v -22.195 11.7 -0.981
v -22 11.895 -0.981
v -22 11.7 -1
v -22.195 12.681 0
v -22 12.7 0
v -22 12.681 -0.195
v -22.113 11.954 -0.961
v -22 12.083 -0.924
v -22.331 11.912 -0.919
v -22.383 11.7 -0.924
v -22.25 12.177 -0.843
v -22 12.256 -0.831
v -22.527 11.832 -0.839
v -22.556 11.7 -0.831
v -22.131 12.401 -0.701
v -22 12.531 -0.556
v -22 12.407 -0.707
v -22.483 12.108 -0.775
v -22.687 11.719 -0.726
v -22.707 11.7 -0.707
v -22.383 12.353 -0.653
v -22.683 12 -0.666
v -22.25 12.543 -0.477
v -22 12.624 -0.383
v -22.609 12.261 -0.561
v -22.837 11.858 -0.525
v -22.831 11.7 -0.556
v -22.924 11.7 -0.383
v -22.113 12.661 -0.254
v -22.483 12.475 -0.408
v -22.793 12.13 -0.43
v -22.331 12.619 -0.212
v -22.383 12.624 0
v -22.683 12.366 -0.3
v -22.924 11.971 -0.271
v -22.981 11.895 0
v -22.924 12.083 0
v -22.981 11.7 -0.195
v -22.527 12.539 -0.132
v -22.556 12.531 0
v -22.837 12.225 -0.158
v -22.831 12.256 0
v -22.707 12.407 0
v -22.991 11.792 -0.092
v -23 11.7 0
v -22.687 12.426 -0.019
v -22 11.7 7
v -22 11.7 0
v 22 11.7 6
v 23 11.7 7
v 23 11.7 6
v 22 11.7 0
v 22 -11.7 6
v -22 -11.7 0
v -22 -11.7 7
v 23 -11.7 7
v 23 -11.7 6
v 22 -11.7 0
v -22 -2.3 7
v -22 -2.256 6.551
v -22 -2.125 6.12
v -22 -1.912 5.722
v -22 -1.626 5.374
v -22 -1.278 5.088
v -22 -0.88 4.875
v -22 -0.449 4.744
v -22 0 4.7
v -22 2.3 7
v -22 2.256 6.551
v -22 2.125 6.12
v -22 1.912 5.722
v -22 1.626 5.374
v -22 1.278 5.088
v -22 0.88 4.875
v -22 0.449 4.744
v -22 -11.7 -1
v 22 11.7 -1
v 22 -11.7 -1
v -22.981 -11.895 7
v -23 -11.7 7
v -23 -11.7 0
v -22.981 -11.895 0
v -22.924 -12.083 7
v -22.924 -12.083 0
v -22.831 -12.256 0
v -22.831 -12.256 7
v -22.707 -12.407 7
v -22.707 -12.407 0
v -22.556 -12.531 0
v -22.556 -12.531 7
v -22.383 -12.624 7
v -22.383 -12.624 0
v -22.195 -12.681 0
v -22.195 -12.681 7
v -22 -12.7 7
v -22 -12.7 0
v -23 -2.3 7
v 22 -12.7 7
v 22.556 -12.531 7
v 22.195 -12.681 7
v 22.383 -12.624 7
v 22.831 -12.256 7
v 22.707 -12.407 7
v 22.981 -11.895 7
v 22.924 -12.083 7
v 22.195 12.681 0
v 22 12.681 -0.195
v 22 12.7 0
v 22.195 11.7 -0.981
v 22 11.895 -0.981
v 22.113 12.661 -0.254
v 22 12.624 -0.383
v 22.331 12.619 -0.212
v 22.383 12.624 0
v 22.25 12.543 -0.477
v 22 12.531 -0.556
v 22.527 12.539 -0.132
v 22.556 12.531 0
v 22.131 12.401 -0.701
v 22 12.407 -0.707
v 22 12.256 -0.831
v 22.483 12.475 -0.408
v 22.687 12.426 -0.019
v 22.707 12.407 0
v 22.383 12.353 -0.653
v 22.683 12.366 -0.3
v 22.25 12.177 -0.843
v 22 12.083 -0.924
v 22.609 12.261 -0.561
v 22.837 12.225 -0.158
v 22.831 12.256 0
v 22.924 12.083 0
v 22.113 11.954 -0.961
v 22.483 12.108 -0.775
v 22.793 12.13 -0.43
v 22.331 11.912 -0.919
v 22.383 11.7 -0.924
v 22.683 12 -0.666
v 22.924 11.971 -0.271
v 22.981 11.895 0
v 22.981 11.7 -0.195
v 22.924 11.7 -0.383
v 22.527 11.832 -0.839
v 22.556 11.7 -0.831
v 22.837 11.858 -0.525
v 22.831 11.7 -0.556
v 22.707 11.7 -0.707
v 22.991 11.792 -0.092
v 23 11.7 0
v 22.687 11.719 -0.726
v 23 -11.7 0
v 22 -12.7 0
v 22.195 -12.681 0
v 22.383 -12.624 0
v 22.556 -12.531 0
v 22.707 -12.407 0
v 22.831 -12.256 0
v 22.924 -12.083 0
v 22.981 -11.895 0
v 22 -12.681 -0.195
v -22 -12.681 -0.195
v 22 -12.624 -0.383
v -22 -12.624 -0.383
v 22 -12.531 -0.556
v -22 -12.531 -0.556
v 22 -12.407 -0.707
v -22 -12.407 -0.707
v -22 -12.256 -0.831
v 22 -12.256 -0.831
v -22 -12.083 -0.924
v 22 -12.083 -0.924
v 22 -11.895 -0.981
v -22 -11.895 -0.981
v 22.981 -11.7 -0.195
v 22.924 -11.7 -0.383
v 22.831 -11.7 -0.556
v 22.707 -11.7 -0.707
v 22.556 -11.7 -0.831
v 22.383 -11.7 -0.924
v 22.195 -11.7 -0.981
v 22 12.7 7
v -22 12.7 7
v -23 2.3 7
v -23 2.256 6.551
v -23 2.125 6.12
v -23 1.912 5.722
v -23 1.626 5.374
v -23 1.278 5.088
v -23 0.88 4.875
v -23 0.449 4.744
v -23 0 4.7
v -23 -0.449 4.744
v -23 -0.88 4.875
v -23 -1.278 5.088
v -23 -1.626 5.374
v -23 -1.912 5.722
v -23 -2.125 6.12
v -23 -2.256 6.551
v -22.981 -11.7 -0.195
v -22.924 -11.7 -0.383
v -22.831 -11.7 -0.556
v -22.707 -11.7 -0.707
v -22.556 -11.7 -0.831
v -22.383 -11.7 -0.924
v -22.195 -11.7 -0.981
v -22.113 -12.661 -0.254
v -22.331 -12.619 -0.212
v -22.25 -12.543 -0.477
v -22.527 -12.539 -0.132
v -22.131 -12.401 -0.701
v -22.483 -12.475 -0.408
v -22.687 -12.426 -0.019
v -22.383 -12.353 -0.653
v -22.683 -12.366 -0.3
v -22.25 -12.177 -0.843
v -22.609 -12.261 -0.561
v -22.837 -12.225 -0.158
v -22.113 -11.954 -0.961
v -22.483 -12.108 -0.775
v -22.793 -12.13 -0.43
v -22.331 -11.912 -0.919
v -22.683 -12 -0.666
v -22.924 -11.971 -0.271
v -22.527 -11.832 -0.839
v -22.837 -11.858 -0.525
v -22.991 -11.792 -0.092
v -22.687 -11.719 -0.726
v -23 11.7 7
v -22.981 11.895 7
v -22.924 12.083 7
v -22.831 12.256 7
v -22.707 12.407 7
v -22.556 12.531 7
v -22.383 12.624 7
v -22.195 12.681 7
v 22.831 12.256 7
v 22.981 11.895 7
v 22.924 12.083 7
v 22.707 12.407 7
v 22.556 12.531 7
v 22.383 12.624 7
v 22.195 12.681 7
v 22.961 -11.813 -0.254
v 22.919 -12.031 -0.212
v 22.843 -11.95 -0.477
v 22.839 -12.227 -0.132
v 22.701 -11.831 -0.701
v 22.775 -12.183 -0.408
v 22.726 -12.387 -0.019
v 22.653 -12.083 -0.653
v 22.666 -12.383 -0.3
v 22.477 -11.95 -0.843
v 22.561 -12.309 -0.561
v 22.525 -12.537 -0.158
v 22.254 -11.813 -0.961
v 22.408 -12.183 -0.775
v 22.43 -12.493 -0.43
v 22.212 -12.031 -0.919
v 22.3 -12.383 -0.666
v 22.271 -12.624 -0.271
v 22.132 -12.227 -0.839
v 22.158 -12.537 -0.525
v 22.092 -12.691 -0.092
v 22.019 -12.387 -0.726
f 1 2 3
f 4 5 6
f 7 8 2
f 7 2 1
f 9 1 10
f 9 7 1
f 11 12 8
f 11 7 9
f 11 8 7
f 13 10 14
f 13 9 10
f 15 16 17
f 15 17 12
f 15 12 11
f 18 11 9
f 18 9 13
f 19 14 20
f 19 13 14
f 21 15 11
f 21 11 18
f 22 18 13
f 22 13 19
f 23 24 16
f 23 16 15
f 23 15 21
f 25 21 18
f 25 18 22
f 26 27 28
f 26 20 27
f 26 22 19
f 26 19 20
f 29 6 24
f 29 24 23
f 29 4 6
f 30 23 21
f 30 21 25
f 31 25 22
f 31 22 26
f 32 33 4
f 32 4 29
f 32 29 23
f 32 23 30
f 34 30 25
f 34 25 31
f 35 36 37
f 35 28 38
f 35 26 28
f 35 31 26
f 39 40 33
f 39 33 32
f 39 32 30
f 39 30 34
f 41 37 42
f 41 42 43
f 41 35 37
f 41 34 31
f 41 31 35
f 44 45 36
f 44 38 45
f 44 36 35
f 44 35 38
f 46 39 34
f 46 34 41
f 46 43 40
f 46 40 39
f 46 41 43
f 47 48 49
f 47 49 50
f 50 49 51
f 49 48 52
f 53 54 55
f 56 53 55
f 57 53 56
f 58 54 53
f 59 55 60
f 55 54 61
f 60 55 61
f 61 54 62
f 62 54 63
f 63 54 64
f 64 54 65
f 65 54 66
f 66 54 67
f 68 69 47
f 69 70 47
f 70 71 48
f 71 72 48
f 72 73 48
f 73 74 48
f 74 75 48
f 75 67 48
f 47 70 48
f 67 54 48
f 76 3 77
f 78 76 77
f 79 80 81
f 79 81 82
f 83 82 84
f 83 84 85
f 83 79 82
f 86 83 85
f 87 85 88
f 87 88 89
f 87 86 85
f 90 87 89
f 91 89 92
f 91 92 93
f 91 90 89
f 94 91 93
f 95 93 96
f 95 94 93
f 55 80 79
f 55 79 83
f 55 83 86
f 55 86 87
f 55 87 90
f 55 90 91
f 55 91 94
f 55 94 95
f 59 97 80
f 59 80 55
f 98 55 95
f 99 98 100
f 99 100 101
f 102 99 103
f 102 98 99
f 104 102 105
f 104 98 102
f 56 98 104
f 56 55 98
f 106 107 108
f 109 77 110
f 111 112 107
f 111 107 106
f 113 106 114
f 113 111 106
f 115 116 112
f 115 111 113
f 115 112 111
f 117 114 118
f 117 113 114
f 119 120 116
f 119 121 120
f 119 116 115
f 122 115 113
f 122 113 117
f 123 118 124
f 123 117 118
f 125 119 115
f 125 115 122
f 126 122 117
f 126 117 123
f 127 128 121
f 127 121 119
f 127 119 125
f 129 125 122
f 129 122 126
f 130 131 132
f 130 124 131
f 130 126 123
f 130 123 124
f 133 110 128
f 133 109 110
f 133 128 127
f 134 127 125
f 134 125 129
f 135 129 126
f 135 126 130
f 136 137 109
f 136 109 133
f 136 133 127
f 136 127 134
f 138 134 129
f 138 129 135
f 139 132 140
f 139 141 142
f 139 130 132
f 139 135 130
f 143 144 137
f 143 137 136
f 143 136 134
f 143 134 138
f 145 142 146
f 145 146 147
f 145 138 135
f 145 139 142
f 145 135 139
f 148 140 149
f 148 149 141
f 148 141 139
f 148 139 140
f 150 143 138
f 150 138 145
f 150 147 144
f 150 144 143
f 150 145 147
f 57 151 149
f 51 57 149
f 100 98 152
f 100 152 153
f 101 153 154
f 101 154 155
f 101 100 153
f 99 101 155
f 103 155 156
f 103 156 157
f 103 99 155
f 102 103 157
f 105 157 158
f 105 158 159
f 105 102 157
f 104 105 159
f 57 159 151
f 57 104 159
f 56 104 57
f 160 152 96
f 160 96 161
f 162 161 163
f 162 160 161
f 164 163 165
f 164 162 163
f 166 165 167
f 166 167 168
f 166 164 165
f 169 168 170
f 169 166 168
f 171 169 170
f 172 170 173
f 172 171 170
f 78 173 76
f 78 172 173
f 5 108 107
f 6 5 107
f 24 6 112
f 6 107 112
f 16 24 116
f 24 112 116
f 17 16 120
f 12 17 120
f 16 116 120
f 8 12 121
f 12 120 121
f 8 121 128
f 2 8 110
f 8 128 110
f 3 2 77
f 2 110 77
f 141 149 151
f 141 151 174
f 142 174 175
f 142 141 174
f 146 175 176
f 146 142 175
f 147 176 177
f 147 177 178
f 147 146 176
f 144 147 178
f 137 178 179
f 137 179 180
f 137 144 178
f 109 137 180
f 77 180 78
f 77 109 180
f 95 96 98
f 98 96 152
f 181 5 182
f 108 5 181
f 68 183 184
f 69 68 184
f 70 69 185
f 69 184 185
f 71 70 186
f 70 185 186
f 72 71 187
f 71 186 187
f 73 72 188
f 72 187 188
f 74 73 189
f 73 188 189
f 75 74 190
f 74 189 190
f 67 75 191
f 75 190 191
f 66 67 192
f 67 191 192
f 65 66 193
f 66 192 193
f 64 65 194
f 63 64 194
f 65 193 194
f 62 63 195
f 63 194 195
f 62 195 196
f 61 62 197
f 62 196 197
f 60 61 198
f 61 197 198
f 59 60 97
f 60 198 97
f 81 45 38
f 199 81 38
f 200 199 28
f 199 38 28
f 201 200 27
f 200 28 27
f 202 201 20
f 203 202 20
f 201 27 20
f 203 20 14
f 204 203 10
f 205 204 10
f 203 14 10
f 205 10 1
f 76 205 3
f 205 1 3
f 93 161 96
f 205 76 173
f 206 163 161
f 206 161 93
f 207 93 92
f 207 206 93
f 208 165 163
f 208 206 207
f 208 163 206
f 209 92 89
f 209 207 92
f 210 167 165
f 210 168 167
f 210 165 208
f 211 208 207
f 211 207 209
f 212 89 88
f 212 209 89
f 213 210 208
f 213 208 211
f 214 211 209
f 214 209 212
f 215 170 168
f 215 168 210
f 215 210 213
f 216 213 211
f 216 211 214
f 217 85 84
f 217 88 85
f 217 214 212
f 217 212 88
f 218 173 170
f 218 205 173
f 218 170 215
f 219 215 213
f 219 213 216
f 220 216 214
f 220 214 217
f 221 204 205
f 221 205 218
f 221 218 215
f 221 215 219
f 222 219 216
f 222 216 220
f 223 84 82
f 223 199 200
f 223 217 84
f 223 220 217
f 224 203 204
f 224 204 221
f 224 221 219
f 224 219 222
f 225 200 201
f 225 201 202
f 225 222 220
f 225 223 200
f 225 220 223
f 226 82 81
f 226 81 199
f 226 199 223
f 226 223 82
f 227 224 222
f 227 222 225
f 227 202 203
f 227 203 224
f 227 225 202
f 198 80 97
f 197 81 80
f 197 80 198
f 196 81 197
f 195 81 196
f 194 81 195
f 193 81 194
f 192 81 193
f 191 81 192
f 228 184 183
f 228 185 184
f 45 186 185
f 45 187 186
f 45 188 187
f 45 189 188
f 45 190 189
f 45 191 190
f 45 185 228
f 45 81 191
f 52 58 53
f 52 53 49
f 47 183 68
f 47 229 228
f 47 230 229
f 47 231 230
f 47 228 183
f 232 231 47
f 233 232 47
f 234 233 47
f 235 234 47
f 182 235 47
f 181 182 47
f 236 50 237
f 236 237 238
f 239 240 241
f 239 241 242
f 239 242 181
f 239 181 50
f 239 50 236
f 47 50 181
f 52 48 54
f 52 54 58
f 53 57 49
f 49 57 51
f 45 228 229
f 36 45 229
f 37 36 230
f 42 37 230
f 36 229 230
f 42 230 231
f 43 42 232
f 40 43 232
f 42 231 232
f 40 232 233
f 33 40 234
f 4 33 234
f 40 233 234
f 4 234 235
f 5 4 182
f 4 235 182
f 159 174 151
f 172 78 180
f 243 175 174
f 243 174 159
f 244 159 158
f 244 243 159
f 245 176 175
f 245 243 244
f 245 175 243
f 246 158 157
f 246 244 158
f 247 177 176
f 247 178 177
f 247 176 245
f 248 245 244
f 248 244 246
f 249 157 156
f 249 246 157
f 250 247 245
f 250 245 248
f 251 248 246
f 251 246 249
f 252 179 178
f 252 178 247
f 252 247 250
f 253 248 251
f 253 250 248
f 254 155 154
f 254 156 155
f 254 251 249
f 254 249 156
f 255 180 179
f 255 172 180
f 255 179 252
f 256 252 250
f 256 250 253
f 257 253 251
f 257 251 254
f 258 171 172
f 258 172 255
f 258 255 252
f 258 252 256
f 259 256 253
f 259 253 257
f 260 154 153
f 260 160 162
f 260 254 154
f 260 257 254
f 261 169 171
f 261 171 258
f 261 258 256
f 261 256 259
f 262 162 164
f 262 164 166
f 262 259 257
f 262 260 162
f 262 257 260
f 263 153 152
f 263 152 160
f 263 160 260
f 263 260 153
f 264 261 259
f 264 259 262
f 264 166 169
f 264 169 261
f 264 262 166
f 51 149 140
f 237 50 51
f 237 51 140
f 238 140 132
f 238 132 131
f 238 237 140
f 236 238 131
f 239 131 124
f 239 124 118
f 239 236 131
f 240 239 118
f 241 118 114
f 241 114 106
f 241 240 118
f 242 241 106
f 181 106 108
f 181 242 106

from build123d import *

# Parameters (mm, degrees)
SKETCH016_W     = 44
SKETCH016_H     = 23.4
PAD009_DEPTH    = 7
THICKNESS003_T  = 1
SKETCH017_W     = 23.4
SKETCH017_H     = 1
POCKET005_DEPTH = 1
SKETCH018_R     = 2.3
POCKET006_DEPTH = 1


with BuildPart() as part:
    # Sketch016 → Pad009 (new body)
    with BuildSketch(Plane.XY):
        Rectangle(SKETCH016_W, SKETCH016_H)
    extrude(amount=PAD009_DEPTH)

    # Thickness003
    thickness003_openings = [part.faces().sort_by_distance(p)[0] for p in [
        (0, 0, 7),
    ]]
    offset(amount=THICKNESS003_T, openings=thickness003_openings)

    # Sketch017 (on Face7 of Thickness003) → Pocket005 (cut)
    with BuildSketch(Plane.YZ.offset(23)):
        with Locations((0, 6.5)):
            Rectangle(SKETCH017_W, SKETCH017_H)
    extrude(amount=-POCKET005_DEPTH, mode=Mode.SUBTRACT)

    # Sketch018 (on Face15 of Pocket005) → Pocket006 (cut)
    with BuildSketch(Plane(origin=(-23, 0, 0), x_dir=(0, -1, 0), z_dir=(-1, 0, 0))):
        with Locations((0, 7)):
            Circle(SKETCH018_R)
    extrude(amount=-POCKET006_DEPTH, mode=Mode.SUBTRACT)


solid = part.part
